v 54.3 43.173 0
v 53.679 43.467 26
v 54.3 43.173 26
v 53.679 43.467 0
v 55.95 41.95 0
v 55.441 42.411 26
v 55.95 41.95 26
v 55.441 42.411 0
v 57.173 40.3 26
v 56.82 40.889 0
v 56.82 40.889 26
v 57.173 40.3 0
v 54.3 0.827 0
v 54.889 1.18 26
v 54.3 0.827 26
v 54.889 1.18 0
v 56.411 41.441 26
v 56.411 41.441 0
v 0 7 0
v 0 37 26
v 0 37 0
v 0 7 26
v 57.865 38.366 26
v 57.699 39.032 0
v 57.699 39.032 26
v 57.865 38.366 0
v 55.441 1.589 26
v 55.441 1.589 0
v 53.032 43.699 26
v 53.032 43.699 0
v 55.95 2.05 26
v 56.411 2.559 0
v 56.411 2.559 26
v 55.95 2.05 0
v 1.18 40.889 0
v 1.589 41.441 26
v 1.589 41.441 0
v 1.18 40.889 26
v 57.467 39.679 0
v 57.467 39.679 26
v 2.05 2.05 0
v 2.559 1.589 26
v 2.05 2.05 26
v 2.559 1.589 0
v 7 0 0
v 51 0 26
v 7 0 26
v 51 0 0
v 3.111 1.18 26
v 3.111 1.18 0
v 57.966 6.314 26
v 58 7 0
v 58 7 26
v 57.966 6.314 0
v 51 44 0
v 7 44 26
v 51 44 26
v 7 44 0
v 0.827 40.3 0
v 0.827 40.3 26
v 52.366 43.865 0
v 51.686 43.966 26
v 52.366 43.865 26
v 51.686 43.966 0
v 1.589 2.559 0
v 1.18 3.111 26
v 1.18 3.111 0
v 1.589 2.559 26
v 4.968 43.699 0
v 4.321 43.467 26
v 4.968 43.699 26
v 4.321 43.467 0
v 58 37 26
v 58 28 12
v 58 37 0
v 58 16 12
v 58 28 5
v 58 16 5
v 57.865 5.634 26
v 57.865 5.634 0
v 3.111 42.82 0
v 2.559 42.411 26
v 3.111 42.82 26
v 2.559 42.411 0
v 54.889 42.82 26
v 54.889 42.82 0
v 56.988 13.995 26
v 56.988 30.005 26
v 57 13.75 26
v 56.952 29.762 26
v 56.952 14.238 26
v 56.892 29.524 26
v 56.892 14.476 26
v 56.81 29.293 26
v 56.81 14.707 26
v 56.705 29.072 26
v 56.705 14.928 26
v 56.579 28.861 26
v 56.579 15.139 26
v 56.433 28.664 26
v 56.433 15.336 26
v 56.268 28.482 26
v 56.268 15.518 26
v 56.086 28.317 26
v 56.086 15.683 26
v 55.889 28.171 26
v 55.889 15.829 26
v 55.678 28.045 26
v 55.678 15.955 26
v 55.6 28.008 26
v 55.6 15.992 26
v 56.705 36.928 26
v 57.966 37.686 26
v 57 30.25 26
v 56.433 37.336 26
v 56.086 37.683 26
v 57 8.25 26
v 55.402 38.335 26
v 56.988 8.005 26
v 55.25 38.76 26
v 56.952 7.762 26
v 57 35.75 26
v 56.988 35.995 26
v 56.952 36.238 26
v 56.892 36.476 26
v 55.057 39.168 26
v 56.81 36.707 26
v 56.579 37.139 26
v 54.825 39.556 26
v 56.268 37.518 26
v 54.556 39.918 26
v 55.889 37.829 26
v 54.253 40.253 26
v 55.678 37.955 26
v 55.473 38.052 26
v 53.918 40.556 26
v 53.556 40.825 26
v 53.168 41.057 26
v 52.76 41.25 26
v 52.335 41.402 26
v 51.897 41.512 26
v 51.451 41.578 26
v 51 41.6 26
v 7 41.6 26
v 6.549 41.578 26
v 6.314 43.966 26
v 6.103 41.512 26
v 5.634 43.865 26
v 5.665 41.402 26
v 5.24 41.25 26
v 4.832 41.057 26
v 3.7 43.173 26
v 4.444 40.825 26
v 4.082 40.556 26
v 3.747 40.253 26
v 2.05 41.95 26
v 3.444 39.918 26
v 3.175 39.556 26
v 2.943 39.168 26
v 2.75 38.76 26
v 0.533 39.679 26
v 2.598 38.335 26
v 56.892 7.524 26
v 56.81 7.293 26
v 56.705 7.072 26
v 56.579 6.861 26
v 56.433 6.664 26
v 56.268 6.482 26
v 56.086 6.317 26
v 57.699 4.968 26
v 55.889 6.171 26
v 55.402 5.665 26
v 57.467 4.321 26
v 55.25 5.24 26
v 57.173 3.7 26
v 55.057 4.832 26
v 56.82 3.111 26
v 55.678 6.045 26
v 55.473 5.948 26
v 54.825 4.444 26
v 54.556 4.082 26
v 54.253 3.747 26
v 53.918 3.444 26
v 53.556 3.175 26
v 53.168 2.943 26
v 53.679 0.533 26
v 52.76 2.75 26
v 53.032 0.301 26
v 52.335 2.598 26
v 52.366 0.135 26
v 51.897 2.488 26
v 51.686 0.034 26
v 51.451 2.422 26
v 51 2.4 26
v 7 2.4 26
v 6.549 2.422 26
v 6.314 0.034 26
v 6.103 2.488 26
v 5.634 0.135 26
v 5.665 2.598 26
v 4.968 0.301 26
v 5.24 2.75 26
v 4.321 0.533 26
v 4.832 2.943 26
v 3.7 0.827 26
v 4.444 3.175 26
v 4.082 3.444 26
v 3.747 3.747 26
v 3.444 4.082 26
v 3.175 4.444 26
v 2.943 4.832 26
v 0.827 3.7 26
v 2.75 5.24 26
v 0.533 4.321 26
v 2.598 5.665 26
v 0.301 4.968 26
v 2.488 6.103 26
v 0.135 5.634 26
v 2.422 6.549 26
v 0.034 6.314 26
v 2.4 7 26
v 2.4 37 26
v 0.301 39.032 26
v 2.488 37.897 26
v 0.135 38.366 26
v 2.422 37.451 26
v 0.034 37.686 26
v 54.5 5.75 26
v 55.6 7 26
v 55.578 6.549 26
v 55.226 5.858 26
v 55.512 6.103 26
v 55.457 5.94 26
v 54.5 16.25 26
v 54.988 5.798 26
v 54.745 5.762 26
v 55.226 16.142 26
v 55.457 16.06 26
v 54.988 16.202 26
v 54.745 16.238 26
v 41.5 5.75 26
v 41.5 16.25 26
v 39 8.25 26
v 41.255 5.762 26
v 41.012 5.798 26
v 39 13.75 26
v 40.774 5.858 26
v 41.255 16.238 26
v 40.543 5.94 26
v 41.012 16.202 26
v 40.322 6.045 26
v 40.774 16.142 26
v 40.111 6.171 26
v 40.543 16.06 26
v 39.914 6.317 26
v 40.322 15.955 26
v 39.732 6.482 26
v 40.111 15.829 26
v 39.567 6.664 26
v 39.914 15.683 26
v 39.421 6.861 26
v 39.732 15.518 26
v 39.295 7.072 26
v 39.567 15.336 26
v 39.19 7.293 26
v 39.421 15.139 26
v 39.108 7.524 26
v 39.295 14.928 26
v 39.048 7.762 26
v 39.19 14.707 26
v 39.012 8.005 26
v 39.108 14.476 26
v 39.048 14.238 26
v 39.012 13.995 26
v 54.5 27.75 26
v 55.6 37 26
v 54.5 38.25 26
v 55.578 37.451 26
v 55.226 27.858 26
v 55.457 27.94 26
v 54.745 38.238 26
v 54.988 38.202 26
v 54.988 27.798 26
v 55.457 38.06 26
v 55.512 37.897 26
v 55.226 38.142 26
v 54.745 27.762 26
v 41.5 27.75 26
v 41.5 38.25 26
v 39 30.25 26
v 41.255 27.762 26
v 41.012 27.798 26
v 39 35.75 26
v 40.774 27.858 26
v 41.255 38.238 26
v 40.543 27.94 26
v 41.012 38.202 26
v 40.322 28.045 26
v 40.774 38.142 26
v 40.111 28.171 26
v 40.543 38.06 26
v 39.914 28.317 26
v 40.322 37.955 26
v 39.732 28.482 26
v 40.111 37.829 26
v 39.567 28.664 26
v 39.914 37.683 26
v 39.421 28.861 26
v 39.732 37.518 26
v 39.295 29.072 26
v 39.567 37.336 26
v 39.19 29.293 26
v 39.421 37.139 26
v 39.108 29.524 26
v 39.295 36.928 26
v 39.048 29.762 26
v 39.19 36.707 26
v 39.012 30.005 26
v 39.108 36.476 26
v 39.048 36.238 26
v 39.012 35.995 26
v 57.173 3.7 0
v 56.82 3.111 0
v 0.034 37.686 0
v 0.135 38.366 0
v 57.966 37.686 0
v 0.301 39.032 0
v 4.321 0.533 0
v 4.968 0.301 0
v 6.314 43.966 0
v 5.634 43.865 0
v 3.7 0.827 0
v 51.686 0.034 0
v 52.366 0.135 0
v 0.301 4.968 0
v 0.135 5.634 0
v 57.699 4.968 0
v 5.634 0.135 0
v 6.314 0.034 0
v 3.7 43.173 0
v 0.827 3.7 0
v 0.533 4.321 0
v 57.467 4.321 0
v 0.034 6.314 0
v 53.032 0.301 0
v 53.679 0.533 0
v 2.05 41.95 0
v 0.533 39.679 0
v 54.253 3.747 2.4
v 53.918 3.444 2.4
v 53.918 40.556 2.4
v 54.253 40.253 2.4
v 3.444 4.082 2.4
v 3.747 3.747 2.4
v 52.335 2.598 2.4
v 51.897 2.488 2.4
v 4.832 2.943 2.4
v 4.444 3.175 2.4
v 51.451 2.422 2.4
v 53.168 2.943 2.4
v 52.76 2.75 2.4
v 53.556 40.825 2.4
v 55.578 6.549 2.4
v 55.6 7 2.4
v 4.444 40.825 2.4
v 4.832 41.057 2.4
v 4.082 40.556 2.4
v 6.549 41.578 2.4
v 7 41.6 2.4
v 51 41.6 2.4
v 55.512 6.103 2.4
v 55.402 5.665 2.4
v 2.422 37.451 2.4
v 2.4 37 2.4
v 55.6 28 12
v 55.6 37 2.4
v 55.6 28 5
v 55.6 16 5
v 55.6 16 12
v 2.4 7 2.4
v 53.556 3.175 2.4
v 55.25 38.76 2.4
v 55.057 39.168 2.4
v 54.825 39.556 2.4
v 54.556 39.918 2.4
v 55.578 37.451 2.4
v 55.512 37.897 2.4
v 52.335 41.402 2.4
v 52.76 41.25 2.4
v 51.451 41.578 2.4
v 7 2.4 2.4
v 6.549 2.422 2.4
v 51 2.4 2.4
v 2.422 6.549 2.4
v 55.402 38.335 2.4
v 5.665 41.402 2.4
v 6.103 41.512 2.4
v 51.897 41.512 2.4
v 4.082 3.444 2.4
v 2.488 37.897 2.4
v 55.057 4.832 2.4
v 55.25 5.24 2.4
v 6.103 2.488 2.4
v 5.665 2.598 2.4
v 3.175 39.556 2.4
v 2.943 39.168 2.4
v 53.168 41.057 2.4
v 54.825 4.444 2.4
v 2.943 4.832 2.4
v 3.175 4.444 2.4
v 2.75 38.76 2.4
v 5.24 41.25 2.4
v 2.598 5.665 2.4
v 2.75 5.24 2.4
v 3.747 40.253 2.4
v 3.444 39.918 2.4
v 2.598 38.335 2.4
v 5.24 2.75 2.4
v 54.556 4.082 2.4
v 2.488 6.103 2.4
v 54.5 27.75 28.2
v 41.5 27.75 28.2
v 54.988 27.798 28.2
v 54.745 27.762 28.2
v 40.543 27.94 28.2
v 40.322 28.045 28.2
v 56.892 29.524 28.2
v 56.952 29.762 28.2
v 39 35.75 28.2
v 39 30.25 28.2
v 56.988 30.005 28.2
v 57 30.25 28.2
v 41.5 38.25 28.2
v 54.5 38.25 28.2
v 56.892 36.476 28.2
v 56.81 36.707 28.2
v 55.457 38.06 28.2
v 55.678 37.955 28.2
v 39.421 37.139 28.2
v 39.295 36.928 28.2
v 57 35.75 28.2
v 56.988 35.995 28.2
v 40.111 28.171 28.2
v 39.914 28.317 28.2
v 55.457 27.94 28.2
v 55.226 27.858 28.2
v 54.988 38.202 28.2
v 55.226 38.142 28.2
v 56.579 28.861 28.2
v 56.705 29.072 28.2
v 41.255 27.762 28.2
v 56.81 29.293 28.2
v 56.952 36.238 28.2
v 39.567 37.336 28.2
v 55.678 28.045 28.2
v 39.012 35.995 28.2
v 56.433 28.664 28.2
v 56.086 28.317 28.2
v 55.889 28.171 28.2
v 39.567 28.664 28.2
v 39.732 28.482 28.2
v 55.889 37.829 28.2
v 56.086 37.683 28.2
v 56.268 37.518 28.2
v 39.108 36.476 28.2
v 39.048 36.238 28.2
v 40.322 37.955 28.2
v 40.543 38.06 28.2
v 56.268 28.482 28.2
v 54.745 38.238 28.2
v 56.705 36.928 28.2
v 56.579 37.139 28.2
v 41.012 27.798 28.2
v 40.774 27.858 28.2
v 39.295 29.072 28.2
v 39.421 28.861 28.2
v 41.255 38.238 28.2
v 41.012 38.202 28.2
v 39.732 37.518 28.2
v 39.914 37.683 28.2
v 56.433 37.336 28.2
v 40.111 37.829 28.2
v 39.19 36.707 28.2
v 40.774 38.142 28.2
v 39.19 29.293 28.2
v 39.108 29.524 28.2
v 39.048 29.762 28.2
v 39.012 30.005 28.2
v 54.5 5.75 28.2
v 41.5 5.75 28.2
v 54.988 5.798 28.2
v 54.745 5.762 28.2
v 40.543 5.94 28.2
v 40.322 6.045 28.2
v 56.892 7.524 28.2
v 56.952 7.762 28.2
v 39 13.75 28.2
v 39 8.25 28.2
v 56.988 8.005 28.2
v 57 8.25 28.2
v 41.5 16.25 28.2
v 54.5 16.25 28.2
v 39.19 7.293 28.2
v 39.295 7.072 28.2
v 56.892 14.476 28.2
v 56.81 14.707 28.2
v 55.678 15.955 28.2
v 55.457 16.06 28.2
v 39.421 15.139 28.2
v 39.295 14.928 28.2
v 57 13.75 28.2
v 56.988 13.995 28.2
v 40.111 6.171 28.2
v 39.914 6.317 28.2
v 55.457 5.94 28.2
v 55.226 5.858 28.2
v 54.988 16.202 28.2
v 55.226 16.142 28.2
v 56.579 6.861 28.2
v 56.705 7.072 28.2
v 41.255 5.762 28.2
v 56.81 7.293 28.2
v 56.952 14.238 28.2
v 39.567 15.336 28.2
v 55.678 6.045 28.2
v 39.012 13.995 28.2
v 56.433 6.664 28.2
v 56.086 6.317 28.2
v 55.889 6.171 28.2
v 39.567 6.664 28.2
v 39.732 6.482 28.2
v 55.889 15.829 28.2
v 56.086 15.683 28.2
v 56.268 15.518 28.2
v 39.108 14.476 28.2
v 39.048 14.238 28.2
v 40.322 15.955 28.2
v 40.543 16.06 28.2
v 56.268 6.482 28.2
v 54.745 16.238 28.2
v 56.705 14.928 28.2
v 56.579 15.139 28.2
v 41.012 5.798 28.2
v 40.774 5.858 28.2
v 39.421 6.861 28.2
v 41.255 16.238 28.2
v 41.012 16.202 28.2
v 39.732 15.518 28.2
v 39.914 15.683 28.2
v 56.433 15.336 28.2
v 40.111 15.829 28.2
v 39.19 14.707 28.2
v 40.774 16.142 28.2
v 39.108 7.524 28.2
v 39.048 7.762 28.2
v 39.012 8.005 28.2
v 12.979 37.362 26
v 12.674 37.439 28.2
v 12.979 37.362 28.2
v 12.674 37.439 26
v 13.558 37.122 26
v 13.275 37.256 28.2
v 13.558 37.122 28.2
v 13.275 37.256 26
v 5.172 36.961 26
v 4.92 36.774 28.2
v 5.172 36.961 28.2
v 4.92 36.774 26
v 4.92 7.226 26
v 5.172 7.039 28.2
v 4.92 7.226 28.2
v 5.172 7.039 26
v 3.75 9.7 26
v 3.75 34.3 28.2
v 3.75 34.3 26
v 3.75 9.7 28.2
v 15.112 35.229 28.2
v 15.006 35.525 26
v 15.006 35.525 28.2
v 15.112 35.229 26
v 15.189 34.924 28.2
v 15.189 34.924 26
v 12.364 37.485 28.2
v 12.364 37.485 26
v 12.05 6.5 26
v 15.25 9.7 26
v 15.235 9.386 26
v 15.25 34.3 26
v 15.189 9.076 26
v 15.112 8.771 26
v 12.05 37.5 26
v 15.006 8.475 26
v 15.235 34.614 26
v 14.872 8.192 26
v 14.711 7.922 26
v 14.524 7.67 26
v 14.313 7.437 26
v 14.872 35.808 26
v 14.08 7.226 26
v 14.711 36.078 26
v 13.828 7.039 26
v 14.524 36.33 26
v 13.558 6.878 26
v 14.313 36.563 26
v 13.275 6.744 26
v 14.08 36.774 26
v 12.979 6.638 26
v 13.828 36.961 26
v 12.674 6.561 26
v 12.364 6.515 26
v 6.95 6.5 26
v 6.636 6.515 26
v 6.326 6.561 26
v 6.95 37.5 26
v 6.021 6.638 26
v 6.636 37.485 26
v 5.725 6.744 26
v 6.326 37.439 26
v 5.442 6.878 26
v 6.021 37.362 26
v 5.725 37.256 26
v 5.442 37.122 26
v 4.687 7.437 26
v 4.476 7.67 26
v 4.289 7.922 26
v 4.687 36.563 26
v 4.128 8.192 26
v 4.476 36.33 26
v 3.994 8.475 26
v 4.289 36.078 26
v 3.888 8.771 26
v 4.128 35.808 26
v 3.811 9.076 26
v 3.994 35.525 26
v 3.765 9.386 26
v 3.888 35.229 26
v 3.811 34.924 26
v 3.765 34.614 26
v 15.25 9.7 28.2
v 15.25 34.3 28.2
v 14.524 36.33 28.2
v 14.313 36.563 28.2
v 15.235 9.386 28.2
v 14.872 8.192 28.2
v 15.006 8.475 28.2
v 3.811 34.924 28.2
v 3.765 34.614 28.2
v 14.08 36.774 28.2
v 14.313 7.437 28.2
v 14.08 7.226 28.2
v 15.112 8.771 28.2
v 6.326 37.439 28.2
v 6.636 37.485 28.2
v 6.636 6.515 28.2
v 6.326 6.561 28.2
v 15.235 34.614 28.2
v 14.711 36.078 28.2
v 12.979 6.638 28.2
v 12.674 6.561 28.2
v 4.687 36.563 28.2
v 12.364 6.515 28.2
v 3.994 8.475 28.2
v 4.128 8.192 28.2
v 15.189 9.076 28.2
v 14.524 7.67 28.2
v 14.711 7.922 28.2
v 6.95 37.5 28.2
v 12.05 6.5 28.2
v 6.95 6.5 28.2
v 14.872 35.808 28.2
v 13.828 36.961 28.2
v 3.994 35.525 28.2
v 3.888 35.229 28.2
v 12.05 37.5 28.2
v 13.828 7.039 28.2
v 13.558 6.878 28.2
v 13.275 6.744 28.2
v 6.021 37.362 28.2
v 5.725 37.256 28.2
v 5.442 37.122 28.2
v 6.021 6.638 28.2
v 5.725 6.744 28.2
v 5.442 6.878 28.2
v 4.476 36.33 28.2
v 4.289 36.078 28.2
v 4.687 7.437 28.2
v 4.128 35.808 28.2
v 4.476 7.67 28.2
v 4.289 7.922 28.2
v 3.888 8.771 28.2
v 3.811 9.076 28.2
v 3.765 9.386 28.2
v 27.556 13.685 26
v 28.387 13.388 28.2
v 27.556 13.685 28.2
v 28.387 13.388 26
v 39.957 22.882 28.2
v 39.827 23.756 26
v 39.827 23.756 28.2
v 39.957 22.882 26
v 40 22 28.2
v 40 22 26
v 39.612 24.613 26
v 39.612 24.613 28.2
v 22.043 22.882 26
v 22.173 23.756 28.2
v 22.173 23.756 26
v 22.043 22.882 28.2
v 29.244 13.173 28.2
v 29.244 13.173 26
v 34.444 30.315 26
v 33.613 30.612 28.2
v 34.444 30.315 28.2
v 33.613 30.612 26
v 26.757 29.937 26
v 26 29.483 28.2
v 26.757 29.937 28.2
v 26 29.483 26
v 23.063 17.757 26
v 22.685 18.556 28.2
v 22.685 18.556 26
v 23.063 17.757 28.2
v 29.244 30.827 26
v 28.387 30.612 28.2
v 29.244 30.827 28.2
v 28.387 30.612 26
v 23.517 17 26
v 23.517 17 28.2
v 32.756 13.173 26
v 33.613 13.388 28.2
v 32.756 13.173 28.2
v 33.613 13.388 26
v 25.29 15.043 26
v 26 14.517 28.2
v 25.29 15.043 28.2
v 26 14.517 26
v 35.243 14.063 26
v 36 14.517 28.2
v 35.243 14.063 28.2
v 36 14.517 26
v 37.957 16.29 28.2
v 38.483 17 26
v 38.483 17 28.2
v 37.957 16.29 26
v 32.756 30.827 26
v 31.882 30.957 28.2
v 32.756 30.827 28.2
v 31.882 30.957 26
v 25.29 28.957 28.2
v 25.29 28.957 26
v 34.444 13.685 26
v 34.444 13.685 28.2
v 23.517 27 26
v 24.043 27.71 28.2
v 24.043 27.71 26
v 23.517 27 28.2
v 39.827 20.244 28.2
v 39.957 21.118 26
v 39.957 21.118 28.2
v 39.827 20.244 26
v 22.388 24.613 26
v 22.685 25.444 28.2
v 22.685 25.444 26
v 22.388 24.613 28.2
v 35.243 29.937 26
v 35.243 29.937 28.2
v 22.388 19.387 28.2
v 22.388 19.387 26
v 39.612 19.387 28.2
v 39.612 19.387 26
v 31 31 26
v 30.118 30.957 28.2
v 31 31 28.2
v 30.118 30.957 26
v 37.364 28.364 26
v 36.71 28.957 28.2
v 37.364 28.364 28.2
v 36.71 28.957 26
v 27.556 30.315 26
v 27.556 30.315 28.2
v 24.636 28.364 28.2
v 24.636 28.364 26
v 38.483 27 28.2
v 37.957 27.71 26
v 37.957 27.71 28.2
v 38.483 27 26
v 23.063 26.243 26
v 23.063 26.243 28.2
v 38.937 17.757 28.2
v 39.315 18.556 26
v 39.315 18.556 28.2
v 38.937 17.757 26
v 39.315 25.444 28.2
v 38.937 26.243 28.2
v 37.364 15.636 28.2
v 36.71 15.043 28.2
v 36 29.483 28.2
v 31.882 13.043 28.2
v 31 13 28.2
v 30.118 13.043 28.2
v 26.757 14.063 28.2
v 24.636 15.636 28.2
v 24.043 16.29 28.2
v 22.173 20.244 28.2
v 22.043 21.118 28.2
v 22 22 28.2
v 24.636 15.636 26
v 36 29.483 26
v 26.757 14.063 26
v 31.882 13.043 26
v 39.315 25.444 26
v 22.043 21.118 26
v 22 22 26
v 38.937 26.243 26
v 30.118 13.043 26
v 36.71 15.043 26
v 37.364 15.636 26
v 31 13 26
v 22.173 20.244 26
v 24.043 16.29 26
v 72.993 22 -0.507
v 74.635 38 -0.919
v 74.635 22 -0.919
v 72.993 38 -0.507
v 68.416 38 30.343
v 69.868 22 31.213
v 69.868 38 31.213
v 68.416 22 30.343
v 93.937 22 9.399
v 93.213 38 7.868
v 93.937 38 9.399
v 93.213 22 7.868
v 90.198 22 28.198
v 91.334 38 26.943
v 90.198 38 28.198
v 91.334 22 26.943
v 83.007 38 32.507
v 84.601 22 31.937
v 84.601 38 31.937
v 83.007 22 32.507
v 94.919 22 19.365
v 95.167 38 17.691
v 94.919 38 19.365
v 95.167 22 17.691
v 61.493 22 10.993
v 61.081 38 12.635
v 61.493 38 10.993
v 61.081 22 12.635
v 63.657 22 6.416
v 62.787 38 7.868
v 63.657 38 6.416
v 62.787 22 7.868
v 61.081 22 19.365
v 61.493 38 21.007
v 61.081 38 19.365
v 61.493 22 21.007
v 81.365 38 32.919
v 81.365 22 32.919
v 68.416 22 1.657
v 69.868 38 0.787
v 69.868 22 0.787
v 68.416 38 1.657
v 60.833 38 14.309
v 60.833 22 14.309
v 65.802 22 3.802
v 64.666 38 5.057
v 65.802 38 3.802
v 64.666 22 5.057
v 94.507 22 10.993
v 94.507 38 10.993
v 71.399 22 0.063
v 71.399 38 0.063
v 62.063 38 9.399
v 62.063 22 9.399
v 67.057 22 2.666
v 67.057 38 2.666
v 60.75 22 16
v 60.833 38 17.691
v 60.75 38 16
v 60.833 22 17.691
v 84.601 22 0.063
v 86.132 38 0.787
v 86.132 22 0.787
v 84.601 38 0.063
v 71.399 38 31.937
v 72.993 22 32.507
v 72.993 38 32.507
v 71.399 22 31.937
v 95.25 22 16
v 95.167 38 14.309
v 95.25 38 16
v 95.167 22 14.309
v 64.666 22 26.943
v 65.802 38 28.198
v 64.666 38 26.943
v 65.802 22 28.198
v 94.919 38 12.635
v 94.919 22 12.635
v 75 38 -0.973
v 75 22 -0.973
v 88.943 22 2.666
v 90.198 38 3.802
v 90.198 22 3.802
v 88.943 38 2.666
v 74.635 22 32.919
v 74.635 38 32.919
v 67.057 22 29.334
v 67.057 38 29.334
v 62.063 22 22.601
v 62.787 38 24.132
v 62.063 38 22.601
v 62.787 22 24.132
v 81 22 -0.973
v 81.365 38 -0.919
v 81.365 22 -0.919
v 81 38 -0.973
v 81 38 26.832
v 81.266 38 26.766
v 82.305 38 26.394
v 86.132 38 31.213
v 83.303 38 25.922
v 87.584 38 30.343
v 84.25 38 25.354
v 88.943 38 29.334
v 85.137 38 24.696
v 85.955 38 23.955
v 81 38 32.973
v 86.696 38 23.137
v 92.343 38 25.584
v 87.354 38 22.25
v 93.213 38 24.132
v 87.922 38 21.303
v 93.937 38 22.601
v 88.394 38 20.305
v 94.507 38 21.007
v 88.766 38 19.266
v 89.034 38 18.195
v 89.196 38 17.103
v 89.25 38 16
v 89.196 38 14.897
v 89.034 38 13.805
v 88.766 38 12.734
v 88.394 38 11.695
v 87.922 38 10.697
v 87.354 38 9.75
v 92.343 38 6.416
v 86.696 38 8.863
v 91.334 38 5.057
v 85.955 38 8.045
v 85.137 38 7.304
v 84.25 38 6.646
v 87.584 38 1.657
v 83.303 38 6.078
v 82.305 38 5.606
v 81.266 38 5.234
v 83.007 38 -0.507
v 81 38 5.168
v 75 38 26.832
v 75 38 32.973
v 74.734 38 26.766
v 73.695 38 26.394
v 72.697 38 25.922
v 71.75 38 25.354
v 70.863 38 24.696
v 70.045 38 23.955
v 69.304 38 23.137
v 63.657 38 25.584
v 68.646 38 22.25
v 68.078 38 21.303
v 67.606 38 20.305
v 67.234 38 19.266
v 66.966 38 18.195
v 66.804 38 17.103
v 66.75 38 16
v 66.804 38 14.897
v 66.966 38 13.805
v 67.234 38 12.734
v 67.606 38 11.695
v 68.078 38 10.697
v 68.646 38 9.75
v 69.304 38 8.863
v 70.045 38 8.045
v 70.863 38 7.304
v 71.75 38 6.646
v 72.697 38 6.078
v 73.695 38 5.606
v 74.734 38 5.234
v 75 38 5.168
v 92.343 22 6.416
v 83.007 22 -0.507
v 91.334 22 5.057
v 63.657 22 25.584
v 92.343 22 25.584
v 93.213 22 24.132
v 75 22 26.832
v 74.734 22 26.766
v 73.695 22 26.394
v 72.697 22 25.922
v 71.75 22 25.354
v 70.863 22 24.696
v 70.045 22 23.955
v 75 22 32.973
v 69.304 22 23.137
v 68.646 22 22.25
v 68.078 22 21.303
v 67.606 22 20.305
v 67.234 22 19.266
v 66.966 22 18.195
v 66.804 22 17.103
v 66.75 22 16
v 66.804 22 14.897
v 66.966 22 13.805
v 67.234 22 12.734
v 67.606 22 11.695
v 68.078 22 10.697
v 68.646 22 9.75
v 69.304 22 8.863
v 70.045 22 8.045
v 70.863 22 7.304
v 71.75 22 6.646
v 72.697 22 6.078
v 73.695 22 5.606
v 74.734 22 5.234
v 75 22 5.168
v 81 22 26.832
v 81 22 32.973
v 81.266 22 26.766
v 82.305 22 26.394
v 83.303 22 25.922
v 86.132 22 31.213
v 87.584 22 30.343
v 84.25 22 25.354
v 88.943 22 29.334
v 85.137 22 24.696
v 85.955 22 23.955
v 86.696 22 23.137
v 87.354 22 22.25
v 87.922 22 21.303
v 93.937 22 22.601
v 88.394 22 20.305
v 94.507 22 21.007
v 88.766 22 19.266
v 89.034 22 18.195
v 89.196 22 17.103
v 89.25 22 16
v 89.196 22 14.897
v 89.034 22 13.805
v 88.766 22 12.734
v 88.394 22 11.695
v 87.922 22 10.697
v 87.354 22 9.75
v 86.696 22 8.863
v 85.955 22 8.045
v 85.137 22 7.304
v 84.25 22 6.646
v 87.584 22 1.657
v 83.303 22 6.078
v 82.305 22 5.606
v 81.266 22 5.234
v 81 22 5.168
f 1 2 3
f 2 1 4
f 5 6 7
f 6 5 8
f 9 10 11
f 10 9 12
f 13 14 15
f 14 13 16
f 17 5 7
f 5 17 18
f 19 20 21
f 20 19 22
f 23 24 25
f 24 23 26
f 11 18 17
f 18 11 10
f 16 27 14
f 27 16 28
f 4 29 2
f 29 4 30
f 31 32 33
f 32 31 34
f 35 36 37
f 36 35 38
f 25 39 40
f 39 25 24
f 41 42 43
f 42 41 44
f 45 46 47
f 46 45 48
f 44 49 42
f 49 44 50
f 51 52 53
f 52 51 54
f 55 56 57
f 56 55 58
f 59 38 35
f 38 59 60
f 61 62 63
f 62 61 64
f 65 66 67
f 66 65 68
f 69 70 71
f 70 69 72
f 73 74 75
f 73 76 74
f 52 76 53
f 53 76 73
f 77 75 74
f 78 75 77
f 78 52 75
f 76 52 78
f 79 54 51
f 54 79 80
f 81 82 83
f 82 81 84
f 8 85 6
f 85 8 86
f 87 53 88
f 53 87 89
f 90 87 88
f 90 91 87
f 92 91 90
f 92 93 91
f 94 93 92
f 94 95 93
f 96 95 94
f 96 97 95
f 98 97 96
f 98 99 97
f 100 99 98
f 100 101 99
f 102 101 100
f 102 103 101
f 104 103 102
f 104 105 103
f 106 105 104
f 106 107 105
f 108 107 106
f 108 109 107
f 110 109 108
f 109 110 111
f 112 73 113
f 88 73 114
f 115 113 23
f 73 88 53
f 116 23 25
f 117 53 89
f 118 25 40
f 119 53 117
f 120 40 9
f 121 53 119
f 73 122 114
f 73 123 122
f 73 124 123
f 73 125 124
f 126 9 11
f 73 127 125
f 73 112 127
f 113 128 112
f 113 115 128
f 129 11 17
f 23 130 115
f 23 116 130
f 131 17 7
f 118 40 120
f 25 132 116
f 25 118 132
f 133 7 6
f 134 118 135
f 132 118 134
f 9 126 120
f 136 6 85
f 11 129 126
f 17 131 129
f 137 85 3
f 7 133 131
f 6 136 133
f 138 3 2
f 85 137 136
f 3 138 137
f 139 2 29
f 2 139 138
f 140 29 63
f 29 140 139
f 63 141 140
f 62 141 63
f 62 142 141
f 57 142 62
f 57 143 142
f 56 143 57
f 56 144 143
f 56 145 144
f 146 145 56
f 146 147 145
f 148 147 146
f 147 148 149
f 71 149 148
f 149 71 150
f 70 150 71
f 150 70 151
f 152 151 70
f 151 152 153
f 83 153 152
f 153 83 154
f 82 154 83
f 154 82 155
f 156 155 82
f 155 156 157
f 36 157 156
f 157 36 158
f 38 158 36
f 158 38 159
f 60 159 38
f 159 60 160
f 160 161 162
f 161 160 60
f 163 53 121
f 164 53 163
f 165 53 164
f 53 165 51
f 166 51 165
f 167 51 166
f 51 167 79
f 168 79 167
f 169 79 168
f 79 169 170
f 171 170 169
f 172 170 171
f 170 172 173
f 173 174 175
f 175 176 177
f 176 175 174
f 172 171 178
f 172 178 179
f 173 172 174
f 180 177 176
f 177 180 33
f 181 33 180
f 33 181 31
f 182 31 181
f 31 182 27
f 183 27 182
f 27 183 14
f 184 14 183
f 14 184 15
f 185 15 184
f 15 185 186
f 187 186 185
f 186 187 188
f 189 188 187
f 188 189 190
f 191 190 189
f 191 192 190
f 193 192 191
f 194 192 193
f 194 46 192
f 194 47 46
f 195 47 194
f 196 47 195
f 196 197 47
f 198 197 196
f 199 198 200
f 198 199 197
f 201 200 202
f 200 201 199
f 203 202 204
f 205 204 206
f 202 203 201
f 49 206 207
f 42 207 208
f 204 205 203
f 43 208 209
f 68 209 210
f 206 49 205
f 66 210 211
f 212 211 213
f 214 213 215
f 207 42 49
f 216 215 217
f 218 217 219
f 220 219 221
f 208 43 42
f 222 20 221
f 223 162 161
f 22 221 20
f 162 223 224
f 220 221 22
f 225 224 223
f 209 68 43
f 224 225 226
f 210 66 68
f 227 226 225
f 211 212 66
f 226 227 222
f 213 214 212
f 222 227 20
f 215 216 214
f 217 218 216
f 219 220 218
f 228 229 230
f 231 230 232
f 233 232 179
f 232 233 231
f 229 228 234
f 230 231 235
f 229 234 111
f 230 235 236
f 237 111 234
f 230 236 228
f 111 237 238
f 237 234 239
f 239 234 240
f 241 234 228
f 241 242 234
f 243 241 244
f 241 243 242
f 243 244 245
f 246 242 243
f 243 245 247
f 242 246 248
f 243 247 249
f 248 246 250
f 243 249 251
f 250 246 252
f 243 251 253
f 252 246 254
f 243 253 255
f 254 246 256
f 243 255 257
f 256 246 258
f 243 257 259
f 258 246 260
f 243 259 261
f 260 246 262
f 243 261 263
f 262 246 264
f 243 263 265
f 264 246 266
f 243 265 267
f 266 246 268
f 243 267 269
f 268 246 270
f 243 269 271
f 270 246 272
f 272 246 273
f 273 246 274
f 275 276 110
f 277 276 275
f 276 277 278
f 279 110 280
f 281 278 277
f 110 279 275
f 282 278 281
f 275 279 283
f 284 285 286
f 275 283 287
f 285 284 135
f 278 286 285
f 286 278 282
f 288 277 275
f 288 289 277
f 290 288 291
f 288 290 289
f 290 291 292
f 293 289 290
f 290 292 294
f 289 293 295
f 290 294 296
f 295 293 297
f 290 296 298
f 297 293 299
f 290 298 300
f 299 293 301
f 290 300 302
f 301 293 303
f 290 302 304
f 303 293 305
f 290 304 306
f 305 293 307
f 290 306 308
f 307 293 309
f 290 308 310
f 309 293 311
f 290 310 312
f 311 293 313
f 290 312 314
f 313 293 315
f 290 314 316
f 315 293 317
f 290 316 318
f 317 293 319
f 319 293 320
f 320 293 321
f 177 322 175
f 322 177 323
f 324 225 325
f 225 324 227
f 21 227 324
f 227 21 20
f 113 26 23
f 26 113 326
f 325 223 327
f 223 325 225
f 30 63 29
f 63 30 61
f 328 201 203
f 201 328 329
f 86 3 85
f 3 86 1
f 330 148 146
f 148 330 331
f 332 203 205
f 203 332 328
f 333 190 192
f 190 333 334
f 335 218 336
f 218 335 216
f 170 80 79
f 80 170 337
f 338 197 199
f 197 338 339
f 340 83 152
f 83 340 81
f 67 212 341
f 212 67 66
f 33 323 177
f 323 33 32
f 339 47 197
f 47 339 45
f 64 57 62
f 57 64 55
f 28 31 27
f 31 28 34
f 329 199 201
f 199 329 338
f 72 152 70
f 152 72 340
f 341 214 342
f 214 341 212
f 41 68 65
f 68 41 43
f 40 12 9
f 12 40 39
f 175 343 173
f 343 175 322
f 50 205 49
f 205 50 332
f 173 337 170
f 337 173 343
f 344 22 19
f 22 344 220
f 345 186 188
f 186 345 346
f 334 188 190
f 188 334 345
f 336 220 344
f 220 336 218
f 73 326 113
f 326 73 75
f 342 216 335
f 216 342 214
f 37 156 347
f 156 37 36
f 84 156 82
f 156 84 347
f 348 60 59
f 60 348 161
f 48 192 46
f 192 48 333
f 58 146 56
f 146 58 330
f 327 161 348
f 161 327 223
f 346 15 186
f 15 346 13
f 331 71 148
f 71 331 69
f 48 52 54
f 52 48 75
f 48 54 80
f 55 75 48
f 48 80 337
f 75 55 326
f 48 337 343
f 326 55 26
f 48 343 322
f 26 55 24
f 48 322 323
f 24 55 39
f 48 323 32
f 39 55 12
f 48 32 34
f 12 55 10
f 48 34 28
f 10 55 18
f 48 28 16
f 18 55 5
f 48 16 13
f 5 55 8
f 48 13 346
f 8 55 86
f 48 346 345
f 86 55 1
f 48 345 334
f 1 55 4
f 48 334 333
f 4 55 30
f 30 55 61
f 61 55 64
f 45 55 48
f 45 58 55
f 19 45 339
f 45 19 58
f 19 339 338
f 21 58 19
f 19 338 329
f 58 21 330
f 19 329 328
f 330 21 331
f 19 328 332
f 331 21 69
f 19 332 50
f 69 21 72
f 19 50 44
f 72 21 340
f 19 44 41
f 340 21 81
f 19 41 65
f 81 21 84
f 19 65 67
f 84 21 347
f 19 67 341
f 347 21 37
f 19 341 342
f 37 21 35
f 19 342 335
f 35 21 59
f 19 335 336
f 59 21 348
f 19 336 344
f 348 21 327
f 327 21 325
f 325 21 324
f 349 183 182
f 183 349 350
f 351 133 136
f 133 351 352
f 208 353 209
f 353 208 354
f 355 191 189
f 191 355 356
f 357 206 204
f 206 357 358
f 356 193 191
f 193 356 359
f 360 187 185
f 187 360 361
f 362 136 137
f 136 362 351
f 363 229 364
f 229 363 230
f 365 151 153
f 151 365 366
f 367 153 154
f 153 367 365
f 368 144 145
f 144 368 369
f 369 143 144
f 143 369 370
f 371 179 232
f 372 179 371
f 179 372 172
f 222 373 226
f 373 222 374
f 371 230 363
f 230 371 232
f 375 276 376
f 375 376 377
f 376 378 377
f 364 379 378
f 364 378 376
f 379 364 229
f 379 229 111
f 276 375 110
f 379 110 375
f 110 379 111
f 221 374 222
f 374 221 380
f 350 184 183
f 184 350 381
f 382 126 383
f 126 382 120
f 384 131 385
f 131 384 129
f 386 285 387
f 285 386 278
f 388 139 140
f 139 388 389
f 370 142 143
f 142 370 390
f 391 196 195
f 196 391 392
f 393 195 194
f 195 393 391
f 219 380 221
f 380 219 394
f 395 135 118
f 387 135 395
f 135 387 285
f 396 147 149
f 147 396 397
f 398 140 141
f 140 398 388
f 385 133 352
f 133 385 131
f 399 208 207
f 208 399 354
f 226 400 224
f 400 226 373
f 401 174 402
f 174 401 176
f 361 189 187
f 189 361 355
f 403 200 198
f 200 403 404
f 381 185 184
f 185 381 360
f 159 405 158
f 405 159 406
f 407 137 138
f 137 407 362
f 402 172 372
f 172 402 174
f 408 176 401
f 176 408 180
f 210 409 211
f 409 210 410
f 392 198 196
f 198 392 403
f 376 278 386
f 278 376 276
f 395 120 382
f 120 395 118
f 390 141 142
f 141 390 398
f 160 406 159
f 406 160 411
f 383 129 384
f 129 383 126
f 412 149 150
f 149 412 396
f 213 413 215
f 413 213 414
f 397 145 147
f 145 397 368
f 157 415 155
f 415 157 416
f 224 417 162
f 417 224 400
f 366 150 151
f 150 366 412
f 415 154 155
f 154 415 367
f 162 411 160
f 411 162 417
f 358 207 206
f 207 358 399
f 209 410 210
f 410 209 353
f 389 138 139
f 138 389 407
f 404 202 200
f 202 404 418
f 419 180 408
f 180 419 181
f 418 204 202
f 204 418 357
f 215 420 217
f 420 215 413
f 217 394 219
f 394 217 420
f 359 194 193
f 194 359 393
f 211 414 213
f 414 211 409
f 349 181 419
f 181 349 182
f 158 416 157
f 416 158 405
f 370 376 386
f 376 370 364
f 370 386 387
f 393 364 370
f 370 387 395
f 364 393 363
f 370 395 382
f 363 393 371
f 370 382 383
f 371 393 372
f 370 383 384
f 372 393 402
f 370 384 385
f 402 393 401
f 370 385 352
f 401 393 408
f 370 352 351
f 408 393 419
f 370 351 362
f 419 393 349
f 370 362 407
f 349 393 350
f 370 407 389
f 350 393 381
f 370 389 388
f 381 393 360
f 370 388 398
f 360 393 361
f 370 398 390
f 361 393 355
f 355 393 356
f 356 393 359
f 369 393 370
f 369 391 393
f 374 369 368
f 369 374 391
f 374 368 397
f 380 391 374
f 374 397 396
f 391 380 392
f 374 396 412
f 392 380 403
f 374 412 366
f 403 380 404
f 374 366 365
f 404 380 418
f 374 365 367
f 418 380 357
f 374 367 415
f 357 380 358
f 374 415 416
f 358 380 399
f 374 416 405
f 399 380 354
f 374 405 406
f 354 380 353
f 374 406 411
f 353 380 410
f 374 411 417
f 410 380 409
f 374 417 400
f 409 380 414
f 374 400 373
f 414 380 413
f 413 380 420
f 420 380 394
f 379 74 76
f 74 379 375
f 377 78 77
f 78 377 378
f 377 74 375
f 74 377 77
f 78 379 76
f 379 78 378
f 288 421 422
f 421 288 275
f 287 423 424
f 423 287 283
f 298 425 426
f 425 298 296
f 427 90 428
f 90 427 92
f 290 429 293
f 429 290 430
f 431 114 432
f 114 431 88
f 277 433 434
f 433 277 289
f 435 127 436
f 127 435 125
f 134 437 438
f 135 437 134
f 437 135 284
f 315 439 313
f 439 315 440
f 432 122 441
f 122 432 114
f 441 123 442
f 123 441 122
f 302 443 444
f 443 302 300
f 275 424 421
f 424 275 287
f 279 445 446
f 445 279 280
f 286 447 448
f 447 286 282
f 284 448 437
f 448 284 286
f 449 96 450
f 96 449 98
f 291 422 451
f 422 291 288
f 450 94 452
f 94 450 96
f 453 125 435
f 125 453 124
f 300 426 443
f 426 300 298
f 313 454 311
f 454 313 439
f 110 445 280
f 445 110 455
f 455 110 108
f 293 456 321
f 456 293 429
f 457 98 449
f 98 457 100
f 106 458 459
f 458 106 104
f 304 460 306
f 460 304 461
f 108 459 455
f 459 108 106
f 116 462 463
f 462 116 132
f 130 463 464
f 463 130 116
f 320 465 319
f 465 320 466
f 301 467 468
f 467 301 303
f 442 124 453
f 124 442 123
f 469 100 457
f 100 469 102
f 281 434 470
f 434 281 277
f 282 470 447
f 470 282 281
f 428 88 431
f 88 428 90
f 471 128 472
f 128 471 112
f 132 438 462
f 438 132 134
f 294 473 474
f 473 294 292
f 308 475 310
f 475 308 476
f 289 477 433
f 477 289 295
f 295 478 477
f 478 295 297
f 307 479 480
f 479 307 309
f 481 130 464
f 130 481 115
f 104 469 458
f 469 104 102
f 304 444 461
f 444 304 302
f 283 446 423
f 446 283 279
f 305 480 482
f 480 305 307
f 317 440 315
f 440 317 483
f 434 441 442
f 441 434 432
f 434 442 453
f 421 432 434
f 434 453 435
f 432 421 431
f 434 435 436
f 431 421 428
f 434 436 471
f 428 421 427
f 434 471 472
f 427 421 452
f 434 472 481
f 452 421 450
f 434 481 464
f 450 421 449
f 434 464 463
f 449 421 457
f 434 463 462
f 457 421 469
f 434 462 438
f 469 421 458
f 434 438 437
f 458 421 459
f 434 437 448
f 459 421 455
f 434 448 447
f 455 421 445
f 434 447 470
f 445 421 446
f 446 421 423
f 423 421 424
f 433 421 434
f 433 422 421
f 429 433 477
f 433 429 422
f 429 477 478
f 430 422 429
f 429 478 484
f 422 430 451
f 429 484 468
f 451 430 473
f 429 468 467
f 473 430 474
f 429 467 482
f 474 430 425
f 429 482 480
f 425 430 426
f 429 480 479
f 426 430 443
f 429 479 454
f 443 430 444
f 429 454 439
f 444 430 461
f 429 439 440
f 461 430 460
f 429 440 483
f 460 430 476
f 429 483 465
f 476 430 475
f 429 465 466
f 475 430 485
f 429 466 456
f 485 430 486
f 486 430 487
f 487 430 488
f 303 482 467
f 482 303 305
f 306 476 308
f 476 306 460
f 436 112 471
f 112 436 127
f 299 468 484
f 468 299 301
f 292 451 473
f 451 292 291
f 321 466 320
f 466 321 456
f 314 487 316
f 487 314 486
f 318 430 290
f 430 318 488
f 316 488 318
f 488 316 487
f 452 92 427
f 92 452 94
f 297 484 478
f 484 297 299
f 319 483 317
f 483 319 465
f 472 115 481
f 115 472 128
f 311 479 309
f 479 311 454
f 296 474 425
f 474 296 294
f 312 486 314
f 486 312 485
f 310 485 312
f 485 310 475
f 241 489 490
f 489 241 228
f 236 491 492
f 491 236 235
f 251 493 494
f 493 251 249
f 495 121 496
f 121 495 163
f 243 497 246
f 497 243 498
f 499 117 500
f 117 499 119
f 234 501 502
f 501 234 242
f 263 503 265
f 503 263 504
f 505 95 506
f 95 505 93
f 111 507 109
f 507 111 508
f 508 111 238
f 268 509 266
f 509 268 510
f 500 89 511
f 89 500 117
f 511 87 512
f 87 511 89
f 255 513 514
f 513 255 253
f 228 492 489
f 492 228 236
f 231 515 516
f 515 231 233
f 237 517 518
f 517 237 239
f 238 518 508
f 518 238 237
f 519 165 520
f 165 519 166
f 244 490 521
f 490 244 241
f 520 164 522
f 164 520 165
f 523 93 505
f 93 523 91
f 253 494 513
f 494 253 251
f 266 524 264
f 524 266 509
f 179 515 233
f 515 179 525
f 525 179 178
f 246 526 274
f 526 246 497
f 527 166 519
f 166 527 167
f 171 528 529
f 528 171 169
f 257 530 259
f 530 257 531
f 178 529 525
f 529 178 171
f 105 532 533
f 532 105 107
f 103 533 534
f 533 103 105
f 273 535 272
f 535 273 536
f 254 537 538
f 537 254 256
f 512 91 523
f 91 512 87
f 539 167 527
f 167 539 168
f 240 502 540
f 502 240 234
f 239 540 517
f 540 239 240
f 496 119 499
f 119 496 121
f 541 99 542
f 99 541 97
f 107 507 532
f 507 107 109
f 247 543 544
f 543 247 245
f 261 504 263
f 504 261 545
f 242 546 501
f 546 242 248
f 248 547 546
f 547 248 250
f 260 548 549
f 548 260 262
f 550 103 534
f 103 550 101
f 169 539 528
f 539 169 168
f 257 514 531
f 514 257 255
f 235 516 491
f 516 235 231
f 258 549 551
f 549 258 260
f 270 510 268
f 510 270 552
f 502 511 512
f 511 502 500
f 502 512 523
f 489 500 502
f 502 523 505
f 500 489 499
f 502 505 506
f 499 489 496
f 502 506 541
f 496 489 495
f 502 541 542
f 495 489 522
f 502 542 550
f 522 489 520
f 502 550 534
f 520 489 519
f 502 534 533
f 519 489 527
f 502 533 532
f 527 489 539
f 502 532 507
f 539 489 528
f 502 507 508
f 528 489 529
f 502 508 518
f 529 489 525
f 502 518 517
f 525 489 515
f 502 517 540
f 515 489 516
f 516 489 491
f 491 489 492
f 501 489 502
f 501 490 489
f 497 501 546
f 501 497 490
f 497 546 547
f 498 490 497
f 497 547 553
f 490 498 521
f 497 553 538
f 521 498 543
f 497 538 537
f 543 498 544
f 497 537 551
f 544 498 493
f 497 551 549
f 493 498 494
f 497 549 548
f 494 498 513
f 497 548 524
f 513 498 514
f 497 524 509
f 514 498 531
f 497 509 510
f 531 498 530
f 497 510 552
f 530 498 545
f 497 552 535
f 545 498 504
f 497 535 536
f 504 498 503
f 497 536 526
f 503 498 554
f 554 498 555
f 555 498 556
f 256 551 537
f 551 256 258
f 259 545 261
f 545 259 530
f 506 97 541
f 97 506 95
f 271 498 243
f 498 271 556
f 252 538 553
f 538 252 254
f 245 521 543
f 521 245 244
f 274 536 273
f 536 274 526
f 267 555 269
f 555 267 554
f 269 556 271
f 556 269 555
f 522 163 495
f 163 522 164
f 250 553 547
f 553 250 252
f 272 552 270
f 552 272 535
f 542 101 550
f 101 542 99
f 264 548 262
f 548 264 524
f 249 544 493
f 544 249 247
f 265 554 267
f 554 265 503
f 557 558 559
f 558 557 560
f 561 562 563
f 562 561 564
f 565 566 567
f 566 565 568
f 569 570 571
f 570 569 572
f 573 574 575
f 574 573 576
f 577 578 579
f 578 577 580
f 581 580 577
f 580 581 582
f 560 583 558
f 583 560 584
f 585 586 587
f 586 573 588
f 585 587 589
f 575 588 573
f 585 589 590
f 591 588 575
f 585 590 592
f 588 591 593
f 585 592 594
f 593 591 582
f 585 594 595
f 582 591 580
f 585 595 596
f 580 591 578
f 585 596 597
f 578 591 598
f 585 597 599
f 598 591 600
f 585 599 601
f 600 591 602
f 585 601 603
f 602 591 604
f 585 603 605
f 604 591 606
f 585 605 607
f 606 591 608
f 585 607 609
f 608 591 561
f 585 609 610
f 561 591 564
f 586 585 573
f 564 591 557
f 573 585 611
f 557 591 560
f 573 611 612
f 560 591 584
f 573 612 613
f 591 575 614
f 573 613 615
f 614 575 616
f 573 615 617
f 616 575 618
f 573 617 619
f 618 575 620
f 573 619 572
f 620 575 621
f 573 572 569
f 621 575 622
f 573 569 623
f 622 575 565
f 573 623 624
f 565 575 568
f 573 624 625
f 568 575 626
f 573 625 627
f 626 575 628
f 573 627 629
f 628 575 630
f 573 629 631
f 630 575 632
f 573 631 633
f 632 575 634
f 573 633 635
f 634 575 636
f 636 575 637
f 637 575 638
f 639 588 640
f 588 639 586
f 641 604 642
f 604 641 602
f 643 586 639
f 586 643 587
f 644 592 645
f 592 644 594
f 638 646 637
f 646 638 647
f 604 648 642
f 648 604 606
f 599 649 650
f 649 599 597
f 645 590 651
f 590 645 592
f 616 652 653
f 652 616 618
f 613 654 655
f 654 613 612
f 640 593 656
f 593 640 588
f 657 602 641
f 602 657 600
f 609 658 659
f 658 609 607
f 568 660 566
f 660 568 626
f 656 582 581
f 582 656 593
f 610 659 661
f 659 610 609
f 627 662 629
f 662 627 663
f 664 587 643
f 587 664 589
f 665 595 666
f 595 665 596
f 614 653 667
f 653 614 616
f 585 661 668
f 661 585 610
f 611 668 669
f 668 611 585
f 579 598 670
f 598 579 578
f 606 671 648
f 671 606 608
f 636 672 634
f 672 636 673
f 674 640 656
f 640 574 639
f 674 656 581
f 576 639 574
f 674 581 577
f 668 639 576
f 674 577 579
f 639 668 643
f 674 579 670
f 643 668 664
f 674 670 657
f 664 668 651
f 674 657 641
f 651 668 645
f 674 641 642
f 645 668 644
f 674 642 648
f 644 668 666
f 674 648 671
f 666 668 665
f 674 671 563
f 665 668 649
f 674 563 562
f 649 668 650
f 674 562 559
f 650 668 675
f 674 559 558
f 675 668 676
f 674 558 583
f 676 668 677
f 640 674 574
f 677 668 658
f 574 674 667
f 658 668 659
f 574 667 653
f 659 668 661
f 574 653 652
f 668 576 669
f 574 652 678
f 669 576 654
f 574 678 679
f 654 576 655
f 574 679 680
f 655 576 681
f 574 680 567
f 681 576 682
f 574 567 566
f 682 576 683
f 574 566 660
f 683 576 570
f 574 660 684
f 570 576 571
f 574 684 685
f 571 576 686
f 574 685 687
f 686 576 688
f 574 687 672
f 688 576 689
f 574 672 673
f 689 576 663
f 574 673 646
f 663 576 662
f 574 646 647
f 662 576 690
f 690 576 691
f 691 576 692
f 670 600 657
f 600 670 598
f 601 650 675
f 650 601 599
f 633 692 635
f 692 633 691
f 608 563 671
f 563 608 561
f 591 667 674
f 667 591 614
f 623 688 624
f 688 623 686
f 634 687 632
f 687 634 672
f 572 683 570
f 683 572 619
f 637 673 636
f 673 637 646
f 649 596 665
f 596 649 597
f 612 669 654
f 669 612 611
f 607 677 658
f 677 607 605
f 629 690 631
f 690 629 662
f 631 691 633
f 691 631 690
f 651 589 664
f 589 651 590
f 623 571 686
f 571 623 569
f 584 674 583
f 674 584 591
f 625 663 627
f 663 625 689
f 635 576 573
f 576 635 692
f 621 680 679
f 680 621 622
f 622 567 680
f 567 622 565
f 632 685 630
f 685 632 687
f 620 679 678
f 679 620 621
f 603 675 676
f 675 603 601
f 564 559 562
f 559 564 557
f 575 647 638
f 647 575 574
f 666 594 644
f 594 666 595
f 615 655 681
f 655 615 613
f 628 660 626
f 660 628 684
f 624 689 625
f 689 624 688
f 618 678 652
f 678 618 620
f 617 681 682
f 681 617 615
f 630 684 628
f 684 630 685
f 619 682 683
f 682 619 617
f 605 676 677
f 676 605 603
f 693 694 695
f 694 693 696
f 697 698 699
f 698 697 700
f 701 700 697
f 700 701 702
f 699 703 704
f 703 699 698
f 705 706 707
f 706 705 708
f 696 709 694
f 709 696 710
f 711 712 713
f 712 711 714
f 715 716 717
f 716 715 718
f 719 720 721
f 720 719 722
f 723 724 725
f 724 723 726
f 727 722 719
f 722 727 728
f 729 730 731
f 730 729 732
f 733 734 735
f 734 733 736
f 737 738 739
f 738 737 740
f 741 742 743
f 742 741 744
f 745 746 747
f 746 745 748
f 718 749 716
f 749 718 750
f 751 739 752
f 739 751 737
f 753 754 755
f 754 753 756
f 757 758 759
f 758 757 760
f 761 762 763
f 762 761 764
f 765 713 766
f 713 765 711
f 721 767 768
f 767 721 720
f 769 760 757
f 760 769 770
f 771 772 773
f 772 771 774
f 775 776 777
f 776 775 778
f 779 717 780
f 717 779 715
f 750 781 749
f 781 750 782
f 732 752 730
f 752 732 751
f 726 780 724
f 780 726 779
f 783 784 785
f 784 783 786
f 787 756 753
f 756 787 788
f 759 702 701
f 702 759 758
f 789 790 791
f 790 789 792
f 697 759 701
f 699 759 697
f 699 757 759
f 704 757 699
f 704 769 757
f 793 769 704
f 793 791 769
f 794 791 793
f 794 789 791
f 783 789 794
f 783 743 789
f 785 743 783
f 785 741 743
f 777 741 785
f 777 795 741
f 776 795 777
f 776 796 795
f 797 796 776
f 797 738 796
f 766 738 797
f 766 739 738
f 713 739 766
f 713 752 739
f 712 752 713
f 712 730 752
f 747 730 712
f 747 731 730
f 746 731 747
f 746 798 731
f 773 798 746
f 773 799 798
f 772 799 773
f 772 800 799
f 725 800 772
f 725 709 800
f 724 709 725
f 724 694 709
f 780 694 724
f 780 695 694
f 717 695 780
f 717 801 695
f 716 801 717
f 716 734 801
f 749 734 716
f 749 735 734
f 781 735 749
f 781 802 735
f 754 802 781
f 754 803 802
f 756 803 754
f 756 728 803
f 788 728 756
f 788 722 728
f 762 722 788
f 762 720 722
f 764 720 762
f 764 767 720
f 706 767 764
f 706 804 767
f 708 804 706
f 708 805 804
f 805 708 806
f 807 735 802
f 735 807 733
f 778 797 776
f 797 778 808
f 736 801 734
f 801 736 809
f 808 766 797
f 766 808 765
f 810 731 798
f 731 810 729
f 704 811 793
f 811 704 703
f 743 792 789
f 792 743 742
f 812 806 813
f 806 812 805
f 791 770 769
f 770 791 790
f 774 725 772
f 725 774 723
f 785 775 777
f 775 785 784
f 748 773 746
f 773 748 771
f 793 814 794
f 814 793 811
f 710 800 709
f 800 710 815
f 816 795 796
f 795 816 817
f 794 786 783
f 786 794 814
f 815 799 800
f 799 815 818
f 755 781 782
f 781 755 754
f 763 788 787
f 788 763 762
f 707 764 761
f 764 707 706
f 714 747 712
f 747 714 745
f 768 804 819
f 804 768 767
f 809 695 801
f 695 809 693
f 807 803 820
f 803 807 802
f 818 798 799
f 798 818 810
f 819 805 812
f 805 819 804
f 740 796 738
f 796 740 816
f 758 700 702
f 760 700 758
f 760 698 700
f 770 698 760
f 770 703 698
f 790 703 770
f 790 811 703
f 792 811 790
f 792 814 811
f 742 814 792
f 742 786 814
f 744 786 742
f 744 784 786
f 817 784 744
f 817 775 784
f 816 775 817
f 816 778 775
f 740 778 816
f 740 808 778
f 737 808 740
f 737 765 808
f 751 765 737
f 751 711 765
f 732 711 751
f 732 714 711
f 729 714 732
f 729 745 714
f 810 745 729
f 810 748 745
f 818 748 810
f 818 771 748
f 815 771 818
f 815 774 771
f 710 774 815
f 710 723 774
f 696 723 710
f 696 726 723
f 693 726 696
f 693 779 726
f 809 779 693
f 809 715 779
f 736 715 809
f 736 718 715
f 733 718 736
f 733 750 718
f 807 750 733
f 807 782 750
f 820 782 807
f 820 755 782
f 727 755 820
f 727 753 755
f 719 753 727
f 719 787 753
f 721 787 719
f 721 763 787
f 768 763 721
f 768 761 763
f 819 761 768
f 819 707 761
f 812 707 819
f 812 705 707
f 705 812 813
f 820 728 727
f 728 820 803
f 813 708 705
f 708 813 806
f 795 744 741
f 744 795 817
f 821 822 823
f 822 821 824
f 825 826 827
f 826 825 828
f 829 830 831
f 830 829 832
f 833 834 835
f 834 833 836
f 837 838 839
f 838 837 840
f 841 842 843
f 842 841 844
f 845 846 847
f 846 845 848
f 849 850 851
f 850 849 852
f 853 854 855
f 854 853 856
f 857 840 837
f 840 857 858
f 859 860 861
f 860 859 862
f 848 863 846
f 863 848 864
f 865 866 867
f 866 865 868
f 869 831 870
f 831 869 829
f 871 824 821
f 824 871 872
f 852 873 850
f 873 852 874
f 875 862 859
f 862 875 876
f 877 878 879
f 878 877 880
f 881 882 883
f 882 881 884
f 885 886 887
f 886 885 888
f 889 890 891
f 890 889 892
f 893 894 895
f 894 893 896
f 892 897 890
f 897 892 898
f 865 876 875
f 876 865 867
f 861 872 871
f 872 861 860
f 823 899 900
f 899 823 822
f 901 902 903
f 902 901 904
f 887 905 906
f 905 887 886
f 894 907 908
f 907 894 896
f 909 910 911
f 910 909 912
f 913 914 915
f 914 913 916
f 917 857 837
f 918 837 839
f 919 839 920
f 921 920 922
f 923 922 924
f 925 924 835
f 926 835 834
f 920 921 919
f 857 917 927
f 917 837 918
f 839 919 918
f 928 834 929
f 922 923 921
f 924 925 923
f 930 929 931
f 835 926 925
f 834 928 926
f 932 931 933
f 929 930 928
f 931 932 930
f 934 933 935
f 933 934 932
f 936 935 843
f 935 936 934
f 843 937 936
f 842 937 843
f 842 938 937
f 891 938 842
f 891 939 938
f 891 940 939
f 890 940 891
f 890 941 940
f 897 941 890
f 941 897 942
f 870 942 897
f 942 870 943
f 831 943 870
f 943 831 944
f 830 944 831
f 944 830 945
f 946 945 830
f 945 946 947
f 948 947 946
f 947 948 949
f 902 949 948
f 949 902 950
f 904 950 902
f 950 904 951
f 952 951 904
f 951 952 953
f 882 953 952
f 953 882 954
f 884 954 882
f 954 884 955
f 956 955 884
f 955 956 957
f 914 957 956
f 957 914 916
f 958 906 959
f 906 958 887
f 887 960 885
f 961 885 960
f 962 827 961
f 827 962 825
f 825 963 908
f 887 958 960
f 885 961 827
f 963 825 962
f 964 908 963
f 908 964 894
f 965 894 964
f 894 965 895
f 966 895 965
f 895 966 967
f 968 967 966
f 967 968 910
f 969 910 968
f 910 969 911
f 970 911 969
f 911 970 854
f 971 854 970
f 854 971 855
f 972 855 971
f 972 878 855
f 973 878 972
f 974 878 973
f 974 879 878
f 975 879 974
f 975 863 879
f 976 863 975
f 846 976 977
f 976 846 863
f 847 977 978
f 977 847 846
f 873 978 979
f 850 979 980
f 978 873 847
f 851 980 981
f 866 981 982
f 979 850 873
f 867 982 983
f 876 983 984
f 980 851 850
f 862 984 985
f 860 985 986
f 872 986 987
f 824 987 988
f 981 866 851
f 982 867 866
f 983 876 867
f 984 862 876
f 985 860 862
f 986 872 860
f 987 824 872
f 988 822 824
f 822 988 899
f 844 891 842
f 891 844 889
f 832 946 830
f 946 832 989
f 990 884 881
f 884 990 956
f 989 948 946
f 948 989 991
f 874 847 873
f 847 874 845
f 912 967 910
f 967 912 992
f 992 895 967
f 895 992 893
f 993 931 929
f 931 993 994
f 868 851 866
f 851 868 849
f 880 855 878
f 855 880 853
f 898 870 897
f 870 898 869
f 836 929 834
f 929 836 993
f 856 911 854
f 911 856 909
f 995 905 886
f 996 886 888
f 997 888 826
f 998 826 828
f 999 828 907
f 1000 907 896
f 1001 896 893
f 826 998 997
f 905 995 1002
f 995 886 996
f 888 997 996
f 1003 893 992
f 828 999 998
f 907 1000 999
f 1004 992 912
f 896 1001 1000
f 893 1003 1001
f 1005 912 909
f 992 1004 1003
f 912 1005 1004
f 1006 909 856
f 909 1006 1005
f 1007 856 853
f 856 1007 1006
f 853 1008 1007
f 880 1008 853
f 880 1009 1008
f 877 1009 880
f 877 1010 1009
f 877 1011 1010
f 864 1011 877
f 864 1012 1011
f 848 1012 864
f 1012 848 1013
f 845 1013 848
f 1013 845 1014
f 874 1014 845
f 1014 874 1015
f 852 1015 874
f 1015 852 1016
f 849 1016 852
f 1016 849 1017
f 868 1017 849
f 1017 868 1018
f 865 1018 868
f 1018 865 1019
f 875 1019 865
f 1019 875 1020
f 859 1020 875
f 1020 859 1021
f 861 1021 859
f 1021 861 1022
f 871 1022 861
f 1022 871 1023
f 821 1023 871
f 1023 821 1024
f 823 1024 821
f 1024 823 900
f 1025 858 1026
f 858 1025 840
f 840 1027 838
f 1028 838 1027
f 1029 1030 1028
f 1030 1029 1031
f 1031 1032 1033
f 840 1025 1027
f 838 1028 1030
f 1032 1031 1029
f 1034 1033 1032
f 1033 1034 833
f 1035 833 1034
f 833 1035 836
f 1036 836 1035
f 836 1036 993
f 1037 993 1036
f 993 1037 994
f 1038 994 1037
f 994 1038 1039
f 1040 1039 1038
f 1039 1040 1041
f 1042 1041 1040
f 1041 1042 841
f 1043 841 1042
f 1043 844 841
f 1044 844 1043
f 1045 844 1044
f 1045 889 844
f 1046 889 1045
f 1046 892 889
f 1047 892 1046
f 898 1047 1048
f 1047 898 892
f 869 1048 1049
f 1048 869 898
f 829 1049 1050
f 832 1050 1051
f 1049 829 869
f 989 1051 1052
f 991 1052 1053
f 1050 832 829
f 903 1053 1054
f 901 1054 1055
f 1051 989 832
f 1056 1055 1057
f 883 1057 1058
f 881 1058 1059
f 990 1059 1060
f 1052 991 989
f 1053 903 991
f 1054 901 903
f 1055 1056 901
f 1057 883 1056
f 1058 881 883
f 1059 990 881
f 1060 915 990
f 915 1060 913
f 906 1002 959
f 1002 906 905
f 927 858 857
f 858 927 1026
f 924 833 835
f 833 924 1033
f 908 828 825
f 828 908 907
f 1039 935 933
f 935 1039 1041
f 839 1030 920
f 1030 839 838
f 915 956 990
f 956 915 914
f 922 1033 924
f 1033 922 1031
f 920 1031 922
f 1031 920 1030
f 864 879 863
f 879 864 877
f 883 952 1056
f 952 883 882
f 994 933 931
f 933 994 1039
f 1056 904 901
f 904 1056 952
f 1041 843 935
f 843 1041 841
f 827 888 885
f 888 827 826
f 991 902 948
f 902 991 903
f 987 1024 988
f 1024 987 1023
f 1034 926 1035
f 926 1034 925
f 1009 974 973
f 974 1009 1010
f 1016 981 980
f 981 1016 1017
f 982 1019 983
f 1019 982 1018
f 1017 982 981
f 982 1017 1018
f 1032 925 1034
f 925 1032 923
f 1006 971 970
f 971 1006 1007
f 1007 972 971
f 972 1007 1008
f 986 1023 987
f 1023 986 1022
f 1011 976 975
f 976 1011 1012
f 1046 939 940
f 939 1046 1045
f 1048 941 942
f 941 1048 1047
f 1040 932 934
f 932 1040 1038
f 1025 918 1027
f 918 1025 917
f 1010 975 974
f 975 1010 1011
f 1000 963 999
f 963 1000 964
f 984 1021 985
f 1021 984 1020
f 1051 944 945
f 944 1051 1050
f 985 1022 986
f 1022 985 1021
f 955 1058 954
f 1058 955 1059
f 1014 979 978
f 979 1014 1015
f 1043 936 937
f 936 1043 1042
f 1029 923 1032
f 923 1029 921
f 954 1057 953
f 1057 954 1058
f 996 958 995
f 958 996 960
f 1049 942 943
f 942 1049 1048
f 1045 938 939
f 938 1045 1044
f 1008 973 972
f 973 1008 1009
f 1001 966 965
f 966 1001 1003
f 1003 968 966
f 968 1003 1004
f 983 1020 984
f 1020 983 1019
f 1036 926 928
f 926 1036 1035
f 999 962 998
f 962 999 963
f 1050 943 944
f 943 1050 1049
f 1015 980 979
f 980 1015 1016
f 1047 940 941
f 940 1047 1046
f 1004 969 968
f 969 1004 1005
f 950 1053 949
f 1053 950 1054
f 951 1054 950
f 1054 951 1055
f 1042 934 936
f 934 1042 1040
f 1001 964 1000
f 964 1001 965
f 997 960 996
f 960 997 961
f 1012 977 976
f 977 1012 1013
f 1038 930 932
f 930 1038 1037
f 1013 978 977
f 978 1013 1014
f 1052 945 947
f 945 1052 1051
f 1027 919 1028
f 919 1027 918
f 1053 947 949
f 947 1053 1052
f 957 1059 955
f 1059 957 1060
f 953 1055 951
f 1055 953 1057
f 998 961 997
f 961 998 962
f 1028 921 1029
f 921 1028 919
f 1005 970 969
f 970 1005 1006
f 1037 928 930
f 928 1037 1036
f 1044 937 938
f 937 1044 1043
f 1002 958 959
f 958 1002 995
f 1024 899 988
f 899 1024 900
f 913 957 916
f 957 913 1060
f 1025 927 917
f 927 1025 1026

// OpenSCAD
// TactileRide V0.1 reference model
// STATIC ERGONOMIC PROTOTYPE ONLY - NOT ROAD READY
// All dimensions in millimetres.

$fn = 64;
case_w = 58.0;
case_h = 44.0;
case_d = 26.0;
corner_r = 7.0;
wall = 2.4;
bar_d = 22.2;
clamp_id = 22.5;
clamp_od = 34.5;
clamp_width = 16.0;

module rounded_box(size=[10,10,10], r=2) {
    hull() {
        for (x=[r, size[0]-r])
            for (y=[r, size[1]-r])
                translate([x,y,0]) cylinder(h=size[2], r=r);
    }
}

module front_shell() {
    difference() {
        rounded_box([case_w,case_h,case_d], corner_r);
        translate([wall,wall,wall])
            rounded_box([case_w-2*wall,case_h-2*wall,case_d-wall+0.1], max(1,corner_r-wall));
        // USB-C service opening on right edge
        translate([case_w-wall-0.2,16,5]) cube([wall+1,12,7]);
    }
}

module buttons() {
    // Volume rocker
    translate([3.75,6.5,case_d])
        rounded_box([11.5,31.0,2.2],3.2);
    // Play/pause
    translate([31.0,22.0,case_d]) cylinder(h=2.2,r=9.0);
    // Next and previous paddles
    for (p=[[48.0,33.0],[48.0,11.0]])
        translate([p[0]-9.0,p[1]-5.25,case_d]) rounded_box([18.0,10.5,2.2],2.5);
}

module clamp_ring() {
    difference() {
        rotate([0,90,0]) cylinder(h=clamp_width,r=clamp_od/2);
        translate([-0.1,0,0]) rotate([0,90,0]) cylinder(h=clamp_width+0.2,r=clamp_id/2);
        // split at bottom
        translate([-1,-3,-clamp_od/2-1]) cube([clamp_width+2,6,clamp_od+2]);
    }
}

module ergonomic_mockup() {
    color("dimgray") front_shell();
    color("lightgray") buttons();
}

// Default preview: controller plus detached clamp reference.
ergonomic_mockup();
translate([case_w+20,case_h/2,clamp_width]) rotate([0,0,90]) color("gray") clamp_ring();
